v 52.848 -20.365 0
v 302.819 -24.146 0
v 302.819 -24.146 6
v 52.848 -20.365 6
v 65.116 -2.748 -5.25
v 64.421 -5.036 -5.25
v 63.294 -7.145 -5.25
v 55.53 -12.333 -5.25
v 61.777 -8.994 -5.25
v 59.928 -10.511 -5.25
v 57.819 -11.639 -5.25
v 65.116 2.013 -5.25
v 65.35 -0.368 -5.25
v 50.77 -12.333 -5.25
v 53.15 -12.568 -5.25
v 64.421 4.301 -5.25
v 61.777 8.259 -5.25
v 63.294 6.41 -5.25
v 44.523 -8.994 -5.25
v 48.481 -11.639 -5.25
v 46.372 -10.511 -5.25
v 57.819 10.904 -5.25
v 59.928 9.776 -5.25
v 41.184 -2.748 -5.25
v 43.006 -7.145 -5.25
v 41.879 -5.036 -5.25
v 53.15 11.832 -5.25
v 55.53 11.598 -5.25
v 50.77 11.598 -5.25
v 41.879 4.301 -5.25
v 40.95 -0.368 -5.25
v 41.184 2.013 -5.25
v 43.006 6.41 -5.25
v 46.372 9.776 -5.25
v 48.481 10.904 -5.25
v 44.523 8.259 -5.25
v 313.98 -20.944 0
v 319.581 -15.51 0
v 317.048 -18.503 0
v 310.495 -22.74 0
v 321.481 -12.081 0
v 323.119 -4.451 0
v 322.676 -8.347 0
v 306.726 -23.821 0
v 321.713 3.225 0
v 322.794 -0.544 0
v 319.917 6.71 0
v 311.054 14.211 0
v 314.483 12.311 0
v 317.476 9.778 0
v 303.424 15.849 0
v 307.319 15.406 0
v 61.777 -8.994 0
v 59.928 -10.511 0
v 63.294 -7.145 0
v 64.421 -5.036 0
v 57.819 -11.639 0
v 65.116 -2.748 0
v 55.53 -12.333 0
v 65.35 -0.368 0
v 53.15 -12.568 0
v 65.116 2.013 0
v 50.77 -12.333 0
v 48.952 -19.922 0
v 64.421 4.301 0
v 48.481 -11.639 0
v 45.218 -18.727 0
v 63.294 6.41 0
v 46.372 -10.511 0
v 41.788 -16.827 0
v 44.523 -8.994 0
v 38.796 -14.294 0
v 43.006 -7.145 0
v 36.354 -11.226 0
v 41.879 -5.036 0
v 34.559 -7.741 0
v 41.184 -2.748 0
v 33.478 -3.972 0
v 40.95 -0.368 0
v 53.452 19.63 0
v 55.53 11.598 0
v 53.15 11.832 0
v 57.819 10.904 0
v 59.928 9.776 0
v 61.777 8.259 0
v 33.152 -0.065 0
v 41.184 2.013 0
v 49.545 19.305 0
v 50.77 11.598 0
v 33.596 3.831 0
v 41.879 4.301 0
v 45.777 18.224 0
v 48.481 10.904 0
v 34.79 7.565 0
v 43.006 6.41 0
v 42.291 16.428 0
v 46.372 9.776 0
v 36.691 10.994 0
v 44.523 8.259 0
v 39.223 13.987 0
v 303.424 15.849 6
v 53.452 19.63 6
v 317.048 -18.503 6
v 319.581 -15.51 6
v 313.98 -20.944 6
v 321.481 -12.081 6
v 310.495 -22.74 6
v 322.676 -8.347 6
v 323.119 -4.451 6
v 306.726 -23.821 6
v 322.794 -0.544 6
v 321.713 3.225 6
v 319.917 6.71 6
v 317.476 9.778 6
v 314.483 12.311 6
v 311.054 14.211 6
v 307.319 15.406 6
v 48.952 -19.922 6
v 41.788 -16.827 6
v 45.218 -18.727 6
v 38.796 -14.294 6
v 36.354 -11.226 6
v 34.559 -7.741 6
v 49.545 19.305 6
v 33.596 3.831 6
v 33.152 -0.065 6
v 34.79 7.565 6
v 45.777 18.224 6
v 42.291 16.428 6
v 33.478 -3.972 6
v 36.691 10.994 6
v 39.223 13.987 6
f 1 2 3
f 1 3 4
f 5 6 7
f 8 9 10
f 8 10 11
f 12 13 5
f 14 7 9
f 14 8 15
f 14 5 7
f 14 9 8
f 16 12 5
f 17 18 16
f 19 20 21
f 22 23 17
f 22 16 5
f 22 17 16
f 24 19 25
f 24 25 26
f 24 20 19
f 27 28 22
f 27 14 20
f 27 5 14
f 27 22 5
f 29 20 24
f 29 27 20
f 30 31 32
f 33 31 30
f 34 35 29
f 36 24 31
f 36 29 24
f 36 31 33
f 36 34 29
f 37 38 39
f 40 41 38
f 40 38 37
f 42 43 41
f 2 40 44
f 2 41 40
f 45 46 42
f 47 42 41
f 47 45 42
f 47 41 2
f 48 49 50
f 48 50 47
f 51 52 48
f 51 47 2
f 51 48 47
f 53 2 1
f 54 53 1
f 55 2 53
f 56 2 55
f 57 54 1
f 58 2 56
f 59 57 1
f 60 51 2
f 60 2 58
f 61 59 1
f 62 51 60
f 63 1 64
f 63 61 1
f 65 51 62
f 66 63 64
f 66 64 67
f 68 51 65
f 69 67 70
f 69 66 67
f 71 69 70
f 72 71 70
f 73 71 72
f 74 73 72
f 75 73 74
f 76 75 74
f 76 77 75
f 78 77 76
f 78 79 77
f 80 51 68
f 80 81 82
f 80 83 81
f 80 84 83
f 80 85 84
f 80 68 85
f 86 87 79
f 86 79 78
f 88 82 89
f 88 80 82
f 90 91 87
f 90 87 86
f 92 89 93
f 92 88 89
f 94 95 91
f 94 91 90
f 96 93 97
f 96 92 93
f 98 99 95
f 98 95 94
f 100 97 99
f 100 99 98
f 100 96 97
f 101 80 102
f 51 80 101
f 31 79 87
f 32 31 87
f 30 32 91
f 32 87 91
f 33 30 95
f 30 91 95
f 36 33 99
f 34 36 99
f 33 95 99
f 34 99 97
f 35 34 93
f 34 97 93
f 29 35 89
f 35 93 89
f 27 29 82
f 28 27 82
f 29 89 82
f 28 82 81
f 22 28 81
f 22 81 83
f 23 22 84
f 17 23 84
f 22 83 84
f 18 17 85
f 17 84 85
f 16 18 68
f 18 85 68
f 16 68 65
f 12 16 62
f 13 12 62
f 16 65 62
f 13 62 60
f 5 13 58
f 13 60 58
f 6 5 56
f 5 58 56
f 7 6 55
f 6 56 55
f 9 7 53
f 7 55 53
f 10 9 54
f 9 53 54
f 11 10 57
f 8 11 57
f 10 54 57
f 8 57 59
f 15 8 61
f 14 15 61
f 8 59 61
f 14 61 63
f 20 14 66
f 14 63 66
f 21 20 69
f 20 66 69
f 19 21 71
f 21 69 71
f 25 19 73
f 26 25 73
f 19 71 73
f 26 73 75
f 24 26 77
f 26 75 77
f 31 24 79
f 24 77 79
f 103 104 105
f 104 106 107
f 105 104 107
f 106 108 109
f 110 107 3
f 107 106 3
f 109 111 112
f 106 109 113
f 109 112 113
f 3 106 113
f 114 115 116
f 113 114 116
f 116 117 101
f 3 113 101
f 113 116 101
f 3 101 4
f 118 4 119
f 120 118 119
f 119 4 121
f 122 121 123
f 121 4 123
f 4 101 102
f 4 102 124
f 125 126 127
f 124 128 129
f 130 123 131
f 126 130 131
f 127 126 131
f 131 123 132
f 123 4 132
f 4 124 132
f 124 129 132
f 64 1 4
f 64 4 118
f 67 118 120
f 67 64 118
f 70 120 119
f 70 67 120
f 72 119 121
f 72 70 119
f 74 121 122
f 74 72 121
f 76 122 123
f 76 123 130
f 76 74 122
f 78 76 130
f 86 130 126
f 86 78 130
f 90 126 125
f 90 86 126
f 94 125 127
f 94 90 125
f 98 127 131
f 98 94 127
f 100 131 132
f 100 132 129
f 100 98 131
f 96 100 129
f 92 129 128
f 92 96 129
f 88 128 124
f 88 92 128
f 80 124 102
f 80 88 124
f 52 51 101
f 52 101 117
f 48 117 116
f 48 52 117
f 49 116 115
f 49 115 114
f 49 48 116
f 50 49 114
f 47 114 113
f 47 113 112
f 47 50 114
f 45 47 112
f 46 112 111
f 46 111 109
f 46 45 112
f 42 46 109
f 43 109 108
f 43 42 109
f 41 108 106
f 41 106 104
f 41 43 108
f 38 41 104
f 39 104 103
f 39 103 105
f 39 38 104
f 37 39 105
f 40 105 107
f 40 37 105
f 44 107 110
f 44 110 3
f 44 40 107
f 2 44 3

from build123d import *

# Parameters (mm, degrees)
BOSS_EXTRUDE1_DEPTH = 6
SKETCH2_R           = 12.2
BOSS_EXTRUDE2_DEPTH = 5.25


with BuildPart() as part:
    # Sketch1 → Boss-Extrude1 (new body)
    with BuildSketch(Plane.XY):
        with BuildLine():
            Line((53.452478751, 19.630204959), (303.423888155, 15.84917852))
            ThreePointArc((303.423888155, 15.84917852), (323.119118527, -4.451016075), (302.818923933, -24.146246447))
            Line((302.818923933, -24.146246447), (52.847514529, -20.365220008))
            ThreePointArc((52.847514529, -20.365220008), (33.152284157, -0.065025413), (53.452478751, 19.630204959))
        make_face()
    extrude(amount=BOSS_EXTRUDE1_DEPTH)

    # Sketch2 → Boss-Extrude2 (add)
    with BuildSketch(Plane(origin=(0, 0, 0), x_dir=(-1, 0, 0), z_dir=(0, 0, -1))):
        with Locations((-53.14999664, -0.367507524)):
            Circle(SKETCH2_R)
    extrude(amount=BOSS_EXTRUDE2_DEPTH)


solid = part.part
